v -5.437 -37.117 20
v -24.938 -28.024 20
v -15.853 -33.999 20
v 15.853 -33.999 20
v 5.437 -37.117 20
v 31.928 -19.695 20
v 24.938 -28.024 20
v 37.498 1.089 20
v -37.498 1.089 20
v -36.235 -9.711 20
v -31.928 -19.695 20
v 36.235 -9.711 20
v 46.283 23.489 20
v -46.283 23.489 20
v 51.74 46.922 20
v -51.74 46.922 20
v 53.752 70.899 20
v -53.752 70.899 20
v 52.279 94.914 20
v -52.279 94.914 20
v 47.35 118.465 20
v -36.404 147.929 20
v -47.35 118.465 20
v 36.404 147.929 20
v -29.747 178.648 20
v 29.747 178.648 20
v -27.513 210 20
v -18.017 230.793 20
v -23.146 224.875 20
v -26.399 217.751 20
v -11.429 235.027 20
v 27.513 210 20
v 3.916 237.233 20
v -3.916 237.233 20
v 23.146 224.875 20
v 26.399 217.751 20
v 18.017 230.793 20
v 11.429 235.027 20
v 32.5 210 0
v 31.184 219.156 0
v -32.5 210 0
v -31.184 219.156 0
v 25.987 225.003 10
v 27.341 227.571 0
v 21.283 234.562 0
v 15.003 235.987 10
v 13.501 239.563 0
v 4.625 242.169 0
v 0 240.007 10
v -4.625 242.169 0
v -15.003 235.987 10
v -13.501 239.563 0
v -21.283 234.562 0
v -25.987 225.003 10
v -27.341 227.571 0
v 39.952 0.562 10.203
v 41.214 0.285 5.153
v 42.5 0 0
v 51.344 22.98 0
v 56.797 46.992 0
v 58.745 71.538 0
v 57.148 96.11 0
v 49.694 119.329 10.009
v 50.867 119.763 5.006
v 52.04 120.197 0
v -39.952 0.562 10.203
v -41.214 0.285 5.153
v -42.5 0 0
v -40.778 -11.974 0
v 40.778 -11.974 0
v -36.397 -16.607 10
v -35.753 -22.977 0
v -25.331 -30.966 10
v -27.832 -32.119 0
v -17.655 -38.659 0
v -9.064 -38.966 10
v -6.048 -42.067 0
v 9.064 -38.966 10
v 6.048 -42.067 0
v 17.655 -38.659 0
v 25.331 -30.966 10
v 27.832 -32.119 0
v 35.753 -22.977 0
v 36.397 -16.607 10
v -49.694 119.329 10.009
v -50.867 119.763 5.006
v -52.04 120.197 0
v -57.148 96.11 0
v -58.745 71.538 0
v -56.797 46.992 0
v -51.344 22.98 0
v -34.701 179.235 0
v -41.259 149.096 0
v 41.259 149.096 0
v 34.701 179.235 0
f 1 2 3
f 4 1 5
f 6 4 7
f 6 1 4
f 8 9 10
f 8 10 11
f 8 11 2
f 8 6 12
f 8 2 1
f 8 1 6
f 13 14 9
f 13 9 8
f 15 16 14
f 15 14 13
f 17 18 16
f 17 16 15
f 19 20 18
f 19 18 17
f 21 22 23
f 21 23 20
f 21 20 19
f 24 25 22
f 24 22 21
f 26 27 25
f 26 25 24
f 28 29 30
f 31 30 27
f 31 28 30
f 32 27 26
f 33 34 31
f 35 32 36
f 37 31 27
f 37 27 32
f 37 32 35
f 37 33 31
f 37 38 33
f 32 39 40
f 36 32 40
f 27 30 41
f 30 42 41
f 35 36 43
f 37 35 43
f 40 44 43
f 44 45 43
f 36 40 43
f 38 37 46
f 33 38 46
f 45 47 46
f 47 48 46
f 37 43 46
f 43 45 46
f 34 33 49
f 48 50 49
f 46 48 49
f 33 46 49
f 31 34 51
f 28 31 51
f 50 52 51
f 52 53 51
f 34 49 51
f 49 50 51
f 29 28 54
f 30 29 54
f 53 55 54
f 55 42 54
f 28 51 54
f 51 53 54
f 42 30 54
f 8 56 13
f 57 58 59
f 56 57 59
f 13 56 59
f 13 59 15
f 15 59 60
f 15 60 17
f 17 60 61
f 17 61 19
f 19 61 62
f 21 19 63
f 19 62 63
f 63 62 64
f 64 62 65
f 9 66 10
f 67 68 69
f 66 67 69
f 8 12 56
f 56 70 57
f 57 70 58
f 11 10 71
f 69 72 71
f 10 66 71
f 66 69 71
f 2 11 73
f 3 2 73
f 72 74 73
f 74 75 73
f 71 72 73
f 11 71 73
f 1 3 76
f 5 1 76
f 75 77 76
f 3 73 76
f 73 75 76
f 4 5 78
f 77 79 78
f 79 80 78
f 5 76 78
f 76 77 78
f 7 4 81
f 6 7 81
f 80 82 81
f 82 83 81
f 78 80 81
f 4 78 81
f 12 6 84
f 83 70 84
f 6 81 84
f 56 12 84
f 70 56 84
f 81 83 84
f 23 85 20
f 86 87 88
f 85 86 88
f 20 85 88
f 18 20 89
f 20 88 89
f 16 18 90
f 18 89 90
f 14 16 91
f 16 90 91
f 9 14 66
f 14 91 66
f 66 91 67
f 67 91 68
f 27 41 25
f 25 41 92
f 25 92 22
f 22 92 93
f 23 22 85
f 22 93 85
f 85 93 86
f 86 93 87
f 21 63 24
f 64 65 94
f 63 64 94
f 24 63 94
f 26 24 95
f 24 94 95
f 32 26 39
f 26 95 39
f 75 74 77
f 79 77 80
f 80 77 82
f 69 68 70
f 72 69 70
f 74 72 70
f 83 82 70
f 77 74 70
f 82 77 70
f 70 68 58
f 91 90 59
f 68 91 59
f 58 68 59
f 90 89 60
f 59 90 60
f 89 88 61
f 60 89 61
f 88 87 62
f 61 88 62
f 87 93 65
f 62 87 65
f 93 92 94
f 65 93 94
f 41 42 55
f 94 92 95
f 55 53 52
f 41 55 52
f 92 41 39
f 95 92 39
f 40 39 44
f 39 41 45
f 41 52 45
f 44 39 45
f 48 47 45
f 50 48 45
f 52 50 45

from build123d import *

# Parameters (mm, degrees)
BOSS_EXTRUDE1_DEPTH = 20
BOSS_EXTRUDE1_DRAFT = 14


with BuildPart() as part:
    # Sketch1 → Boss-Extrude1 (with draft: the straight prism first)
    with BuildSketch(Plane.XY):
        with BuildLine():
            ThreePointArc((-42.5, 0), (0, -42.5), (42.5, 0))
            ThreePointArc((42.5, 0), (58.212978051, 59.230104498), (52.040453066, 120.197332527))
            ThreePointArc((52.040453066, 120.197332527), (37.441607235, 164.047991362), (32.5, 210))
            ThreePointArc((32.5, 210), (0, 242.5), (-32.5, 210))
            ThreePointArc((-32.5, 210), (-37.441607235, 164.047991362), (-52.040453066, 120.197332527))
            ThreePointArc((-52.040453066, 120.197332527), (-58.212978051, 59.230104498), (-42.5, 0))
        make_face()
    extrude(amount=BOSS_EXTRUDE1_DEPTH)
    # Boss-Extrude1: the draft: its side faces are tilted about the plane it starts from
    boss_extrude1_sides = [part.faces().sort_by_distance(p)[0] for p in [
        (-58.212978051, 59.230104498, 10),
        (0, -42.5, 10),
        (58.212978051, 59.230104498, 10),
        (37.441607235, 164.047991362, 10),
        (0, 242.5, 10),
        (-37.441607235, 164.047991362, 10),
    ]]
    draft(boss_extrude1_sides, Plane.XY, BOSS_EXTRUDE1_DRAFT)


solid = part.part
